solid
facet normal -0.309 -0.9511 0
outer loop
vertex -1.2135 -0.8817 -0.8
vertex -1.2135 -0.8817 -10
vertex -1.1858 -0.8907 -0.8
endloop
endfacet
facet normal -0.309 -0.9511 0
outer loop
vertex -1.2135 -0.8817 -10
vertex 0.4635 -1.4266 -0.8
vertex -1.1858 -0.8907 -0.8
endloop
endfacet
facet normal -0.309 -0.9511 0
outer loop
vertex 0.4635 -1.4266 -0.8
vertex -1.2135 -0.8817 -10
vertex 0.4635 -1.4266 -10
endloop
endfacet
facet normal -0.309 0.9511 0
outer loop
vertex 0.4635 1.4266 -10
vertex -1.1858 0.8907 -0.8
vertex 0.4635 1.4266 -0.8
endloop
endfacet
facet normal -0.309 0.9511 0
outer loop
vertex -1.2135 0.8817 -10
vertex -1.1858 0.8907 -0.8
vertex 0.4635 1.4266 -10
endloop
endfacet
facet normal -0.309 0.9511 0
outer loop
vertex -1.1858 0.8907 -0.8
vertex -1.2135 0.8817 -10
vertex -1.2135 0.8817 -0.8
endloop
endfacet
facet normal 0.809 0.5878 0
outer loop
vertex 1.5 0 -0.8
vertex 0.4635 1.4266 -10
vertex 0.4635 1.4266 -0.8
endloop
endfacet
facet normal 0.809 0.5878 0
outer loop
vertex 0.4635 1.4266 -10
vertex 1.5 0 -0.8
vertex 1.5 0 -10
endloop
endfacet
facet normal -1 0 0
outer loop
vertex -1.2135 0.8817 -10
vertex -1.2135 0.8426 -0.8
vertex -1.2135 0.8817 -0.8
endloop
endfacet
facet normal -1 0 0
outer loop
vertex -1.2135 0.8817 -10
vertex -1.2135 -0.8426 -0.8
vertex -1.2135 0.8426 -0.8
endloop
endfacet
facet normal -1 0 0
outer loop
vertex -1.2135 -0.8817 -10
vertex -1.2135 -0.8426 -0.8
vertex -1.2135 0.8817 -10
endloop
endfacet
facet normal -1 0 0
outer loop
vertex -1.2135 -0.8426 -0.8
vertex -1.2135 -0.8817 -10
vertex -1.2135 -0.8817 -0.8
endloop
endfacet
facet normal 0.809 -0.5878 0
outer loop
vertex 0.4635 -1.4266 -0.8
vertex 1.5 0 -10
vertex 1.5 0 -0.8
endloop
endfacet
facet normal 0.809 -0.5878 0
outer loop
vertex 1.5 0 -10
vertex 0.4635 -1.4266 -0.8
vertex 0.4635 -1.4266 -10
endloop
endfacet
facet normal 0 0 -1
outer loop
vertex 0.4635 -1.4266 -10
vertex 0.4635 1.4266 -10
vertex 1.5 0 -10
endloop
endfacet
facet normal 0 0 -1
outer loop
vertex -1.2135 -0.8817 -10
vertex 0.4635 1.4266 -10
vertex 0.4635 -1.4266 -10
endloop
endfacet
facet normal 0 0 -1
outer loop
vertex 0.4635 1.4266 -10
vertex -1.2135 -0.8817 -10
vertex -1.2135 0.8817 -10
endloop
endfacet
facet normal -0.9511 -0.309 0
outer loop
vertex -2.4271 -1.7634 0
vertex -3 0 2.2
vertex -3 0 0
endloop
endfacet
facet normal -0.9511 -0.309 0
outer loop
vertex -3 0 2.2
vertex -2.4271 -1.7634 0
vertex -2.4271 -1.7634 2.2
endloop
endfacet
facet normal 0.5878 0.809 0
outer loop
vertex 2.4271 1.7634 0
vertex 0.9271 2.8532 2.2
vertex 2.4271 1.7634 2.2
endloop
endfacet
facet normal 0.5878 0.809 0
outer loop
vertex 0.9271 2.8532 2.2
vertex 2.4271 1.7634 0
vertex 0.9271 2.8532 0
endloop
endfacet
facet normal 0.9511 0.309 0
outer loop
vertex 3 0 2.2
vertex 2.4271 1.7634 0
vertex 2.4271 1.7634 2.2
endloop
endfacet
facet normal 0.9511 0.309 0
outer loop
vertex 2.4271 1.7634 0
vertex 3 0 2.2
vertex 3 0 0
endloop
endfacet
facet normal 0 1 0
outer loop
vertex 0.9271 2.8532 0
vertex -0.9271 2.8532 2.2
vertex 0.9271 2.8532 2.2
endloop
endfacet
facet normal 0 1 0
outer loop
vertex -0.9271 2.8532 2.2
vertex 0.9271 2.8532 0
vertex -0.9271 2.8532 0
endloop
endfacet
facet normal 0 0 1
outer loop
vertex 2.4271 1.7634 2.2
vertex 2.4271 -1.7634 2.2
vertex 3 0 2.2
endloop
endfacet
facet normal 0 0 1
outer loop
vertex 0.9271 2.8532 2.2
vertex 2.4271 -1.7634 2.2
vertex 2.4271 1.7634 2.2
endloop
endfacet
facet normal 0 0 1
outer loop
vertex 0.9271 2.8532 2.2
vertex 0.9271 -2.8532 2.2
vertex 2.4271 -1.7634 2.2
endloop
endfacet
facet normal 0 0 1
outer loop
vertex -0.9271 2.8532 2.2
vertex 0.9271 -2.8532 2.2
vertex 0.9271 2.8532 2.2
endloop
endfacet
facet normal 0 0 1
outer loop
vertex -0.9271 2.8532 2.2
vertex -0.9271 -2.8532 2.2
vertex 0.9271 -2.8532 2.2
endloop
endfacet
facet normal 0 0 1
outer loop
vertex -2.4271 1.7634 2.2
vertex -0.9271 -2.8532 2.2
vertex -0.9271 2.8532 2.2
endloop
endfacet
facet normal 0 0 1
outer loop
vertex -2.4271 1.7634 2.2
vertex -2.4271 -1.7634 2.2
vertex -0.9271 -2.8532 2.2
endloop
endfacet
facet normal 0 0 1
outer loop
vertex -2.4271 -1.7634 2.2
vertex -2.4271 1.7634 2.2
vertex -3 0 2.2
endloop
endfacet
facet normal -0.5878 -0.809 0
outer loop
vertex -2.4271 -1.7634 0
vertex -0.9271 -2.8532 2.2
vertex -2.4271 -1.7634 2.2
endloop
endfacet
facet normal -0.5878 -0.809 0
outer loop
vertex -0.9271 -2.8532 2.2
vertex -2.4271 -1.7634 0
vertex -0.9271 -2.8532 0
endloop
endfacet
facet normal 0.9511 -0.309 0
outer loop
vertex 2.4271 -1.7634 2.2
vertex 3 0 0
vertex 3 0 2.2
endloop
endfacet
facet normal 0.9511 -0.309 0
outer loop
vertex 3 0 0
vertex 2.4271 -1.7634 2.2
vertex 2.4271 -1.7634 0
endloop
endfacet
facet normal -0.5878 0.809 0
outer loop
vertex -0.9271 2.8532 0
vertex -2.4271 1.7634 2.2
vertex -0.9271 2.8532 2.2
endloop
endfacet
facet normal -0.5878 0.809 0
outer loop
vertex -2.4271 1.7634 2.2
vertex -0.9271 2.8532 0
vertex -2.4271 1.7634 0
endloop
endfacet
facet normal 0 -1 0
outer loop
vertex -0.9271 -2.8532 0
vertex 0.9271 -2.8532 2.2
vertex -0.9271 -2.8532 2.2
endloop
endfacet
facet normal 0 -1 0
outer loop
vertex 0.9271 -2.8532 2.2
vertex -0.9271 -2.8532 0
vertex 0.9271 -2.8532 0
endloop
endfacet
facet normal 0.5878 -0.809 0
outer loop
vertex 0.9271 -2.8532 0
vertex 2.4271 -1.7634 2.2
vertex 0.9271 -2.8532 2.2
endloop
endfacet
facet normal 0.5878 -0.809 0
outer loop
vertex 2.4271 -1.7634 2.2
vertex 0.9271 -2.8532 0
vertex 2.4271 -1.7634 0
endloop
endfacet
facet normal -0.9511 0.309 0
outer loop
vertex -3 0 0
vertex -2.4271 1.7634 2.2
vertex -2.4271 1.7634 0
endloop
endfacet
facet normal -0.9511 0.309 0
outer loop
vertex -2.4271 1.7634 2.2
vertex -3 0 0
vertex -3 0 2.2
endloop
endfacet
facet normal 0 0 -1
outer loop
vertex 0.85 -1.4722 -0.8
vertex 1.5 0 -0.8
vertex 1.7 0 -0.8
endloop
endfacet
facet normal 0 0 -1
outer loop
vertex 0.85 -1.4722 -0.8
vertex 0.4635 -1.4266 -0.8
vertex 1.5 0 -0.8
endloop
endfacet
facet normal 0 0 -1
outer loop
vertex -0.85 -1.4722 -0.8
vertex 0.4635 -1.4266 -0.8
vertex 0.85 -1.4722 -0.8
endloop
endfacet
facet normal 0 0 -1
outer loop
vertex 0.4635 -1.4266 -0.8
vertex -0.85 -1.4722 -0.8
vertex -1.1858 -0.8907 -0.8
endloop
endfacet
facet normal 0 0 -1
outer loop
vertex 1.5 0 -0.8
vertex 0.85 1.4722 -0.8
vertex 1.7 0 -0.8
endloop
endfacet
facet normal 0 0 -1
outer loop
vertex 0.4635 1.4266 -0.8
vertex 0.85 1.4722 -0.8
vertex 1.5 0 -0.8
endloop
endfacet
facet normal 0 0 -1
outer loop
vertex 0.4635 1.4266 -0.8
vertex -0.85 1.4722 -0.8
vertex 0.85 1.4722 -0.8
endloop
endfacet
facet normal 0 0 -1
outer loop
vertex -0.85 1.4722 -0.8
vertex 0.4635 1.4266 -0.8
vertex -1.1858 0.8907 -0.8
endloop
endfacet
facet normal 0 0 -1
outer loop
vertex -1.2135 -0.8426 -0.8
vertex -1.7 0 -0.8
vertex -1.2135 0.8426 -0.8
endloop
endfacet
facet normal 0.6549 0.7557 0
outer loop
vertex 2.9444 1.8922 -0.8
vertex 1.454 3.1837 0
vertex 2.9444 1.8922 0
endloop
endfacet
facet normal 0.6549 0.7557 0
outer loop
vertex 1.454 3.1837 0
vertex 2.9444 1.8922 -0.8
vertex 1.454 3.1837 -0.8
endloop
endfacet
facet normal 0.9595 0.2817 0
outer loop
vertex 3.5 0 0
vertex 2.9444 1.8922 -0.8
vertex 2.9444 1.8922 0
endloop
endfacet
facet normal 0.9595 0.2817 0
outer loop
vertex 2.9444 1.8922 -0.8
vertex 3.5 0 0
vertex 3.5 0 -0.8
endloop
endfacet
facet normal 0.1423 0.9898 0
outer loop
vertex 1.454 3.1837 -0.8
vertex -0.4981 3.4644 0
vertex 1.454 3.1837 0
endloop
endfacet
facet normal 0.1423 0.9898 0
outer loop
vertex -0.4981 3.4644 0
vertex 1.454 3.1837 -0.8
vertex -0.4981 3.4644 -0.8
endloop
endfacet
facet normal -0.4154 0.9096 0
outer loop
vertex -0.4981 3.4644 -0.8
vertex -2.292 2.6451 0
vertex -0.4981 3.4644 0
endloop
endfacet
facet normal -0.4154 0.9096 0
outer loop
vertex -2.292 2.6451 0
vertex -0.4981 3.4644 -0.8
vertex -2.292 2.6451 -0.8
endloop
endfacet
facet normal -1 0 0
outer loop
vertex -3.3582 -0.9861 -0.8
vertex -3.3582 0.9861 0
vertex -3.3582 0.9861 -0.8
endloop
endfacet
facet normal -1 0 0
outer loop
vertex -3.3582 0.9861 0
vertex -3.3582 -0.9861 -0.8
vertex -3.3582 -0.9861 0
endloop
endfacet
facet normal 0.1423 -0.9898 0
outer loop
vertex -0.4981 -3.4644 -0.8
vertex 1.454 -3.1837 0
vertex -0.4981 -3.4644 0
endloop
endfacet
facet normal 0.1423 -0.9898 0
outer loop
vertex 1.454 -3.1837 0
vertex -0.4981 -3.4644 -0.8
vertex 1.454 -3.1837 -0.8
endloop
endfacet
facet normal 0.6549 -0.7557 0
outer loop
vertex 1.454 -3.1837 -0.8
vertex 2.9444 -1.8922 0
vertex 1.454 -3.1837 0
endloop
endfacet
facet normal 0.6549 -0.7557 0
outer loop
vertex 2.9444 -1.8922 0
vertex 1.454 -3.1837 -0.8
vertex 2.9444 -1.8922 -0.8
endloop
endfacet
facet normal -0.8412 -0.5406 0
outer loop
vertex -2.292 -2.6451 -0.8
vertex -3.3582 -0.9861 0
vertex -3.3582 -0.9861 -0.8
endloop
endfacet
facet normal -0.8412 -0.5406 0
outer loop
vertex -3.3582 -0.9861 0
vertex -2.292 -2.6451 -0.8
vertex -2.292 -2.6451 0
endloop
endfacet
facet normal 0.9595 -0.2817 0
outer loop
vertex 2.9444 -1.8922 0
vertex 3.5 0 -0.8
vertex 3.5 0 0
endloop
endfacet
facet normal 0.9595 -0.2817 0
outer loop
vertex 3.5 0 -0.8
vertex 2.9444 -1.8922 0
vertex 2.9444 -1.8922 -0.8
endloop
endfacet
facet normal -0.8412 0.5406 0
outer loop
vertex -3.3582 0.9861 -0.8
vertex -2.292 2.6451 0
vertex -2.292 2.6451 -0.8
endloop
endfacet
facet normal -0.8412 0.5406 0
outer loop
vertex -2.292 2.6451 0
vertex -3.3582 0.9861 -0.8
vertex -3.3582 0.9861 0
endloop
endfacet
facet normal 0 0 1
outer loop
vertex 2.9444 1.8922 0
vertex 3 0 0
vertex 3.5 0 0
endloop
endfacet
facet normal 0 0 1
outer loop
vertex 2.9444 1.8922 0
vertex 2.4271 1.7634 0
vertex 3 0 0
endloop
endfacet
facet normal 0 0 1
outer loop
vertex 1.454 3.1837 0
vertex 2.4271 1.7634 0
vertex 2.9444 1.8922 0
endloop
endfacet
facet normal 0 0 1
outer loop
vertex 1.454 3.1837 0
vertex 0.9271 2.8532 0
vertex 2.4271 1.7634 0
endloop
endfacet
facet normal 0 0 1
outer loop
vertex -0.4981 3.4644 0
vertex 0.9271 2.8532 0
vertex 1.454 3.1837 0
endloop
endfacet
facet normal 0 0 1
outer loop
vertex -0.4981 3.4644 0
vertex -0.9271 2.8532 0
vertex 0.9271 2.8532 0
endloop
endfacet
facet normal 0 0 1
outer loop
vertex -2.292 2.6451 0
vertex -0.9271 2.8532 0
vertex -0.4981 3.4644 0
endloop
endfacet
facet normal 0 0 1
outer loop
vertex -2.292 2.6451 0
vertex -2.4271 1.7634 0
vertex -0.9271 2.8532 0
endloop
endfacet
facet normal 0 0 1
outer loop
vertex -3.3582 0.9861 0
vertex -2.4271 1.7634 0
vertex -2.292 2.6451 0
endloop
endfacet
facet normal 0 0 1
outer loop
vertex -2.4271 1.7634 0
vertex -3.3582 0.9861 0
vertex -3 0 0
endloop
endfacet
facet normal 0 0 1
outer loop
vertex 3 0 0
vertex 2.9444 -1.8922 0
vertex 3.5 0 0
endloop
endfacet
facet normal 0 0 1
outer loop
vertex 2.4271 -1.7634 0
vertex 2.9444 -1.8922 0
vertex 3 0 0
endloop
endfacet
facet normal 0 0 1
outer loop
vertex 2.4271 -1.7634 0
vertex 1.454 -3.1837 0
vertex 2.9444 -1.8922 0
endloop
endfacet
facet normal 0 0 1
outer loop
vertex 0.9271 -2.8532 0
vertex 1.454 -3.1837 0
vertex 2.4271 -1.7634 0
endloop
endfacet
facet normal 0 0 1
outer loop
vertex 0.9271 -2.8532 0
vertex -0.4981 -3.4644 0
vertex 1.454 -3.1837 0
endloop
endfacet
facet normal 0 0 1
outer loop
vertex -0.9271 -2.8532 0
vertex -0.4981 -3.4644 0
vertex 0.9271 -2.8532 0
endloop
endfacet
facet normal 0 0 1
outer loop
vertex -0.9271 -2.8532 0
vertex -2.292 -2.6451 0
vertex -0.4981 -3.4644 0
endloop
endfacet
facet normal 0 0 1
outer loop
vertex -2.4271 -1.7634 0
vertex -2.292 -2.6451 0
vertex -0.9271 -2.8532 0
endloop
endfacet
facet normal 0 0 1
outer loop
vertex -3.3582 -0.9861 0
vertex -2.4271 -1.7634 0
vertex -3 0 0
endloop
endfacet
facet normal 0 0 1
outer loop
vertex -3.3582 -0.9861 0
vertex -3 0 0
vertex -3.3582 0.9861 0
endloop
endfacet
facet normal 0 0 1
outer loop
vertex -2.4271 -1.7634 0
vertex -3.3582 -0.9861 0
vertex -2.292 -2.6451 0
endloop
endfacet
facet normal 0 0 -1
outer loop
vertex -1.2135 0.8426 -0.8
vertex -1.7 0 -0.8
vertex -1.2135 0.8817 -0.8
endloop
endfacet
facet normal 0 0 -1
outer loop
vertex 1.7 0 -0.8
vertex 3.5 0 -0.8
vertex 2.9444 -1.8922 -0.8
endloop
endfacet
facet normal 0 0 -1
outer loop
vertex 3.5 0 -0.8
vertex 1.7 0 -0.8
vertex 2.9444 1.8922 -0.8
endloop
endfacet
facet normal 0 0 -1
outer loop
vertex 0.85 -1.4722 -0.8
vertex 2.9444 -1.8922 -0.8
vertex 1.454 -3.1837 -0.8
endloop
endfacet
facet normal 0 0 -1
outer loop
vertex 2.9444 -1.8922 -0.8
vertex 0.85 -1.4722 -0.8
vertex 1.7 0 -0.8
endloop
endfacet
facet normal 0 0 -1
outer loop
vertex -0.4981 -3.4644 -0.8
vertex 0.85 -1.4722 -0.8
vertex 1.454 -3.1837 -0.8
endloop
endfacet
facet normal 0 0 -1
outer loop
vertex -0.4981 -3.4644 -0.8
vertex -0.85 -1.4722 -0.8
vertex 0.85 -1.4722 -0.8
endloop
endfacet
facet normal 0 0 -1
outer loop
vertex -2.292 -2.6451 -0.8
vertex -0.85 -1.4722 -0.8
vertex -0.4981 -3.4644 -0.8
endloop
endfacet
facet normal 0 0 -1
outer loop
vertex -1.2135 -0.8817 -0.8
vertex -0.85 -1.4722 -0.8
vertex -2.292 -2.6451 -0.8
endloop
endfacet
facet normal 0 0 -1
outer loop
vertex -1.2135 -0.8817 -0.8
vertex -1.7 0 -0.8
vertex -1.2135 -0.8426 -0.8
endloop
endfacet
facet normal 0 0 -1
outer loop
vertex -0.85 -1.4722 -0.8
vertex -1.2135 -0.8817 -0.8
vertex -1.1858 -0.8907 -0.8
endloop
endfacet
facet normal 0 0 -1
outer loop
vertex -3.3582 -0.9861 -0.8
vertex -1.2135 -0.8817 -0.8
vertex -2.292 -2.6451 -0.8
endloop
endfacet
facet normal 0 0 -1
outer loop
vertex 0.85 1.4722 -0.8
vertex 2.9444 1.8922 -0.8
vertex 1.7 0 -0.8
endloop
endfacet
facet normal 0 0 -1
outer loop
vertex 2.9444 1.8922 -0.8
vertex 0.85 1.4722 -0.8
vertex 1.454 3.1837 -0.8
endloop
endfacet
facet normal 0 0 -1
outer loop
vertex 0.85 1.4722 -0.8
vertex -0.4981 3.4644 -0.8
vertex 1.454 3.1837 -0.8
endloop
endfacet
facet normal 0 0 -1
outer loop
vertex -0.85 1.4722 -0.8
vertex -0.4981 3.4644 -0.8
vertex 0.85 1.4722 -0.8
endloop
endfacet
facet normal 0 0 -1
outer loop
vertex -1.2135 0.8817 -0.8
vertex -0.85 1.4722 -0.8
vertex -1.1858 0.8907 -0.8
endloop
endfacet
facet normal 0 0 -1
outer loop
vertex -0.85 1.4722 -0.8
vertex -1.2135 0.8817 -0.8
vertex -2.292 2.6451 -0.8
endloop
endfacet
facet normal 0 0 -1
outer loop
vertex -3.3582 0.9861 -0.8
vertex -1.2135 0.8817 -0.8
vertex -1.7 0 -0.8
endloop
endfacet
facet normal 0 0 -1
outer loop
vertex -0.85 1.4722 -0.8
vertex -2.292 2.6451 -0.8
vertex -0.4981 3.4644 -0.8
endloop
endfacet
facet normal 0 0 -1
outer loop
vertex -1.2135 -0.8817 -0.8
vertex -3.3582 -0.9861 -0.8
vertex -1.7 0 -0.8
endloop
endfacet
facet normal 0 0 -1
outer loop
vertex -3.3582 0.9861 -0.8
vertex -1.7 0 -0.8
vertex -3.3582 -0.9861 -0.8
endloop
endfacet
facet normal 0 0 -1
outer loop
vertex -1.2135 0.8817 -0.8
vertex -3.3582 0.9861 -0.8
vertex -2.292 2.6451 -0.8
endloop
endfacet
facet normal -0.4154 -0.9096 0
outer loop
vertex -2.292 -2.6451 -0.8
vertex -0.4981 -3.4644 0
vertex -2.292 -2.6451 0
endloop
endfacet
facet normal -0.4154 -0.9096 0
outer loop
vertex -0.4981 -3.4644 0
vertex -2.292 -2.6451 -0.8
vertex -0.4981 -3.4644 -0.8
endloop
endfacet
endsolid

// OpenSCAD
// Parameters
thread_diameter_mm = 3.0; //[1.5:6.0:0.1]
length_mm = 10.0; //[5.0:20.0:0.5]
head_diameter_mm = 6.0; //[3.0:12.0:0.1]
head_height_mm = 3.0; //[1.5:6.0:0.1]
hex_socket_af_mm = 2.5; //[1.5:4.0:0.1]
hex_socket_depth_mm = 1.6; //[0.8:3.2:0.1]
washer_outer_diameter_mm = 7.0; //[4.0:14.0:0.1]
washer_thickness_mm = 0.8; //[0.4:1.6:0.1]
washer_hole_diameter_mm = 3.4; //[3.0:5.0:0.1]
overlap_mm = 0.8; //[0.5:2.0:0.1]

// Screw and Washer - complete geometry
module screw_and_washer() {
  color("DimGray") {
    // Threaded Shank
    translate([0, 0, -length_mm/2])
      cylinder(r=thread_diameter_mm/2, h=length_mm, center=true);

    // Cylindrical Cap Head
    translate([0, 0, head_height_mm/2 - overlap_mm])
      cylinder(r=head_diameter_mm/2, h=head_height_mm, center=true);

    // Hex Socket Recess
    translate([0, 0, head_height_mm - hex_socket_depth_mm/2])
      difference() {
        cylinder(r=(hex_socket_af_mm/2)/cos(30), h=hex_socket_depth_mm, center=true);
        rotate([0, 0, 0]) {
          for (i = [0:5]) {
            rotate([0, 0, i*60])
              translate([hex_socket_af_mm/2, 0, 0])
              cube([hex_socket_af_mm, hex_socket_af_mm, hex_socket_depth_mm], center=true);
          }
        }
      }
  }

  color("Silver") {
    // Washer Outer
    translate([0, 0, washer_thickness_mm/2 - overlap_mm])
      difference() {
        cylinder(r=washer_outer_diameter_mm/2, h=washer_thickness_mm, center=true);
        // Washer Hole
        cylinder(r=washer_hole_diameter_mm/2, h=washer_thickness_mm + 2*overlap_mm, center=true);
      }
  }
}

// Assembly
module assembly() {
  screw_and_washer();
}

assembly();
